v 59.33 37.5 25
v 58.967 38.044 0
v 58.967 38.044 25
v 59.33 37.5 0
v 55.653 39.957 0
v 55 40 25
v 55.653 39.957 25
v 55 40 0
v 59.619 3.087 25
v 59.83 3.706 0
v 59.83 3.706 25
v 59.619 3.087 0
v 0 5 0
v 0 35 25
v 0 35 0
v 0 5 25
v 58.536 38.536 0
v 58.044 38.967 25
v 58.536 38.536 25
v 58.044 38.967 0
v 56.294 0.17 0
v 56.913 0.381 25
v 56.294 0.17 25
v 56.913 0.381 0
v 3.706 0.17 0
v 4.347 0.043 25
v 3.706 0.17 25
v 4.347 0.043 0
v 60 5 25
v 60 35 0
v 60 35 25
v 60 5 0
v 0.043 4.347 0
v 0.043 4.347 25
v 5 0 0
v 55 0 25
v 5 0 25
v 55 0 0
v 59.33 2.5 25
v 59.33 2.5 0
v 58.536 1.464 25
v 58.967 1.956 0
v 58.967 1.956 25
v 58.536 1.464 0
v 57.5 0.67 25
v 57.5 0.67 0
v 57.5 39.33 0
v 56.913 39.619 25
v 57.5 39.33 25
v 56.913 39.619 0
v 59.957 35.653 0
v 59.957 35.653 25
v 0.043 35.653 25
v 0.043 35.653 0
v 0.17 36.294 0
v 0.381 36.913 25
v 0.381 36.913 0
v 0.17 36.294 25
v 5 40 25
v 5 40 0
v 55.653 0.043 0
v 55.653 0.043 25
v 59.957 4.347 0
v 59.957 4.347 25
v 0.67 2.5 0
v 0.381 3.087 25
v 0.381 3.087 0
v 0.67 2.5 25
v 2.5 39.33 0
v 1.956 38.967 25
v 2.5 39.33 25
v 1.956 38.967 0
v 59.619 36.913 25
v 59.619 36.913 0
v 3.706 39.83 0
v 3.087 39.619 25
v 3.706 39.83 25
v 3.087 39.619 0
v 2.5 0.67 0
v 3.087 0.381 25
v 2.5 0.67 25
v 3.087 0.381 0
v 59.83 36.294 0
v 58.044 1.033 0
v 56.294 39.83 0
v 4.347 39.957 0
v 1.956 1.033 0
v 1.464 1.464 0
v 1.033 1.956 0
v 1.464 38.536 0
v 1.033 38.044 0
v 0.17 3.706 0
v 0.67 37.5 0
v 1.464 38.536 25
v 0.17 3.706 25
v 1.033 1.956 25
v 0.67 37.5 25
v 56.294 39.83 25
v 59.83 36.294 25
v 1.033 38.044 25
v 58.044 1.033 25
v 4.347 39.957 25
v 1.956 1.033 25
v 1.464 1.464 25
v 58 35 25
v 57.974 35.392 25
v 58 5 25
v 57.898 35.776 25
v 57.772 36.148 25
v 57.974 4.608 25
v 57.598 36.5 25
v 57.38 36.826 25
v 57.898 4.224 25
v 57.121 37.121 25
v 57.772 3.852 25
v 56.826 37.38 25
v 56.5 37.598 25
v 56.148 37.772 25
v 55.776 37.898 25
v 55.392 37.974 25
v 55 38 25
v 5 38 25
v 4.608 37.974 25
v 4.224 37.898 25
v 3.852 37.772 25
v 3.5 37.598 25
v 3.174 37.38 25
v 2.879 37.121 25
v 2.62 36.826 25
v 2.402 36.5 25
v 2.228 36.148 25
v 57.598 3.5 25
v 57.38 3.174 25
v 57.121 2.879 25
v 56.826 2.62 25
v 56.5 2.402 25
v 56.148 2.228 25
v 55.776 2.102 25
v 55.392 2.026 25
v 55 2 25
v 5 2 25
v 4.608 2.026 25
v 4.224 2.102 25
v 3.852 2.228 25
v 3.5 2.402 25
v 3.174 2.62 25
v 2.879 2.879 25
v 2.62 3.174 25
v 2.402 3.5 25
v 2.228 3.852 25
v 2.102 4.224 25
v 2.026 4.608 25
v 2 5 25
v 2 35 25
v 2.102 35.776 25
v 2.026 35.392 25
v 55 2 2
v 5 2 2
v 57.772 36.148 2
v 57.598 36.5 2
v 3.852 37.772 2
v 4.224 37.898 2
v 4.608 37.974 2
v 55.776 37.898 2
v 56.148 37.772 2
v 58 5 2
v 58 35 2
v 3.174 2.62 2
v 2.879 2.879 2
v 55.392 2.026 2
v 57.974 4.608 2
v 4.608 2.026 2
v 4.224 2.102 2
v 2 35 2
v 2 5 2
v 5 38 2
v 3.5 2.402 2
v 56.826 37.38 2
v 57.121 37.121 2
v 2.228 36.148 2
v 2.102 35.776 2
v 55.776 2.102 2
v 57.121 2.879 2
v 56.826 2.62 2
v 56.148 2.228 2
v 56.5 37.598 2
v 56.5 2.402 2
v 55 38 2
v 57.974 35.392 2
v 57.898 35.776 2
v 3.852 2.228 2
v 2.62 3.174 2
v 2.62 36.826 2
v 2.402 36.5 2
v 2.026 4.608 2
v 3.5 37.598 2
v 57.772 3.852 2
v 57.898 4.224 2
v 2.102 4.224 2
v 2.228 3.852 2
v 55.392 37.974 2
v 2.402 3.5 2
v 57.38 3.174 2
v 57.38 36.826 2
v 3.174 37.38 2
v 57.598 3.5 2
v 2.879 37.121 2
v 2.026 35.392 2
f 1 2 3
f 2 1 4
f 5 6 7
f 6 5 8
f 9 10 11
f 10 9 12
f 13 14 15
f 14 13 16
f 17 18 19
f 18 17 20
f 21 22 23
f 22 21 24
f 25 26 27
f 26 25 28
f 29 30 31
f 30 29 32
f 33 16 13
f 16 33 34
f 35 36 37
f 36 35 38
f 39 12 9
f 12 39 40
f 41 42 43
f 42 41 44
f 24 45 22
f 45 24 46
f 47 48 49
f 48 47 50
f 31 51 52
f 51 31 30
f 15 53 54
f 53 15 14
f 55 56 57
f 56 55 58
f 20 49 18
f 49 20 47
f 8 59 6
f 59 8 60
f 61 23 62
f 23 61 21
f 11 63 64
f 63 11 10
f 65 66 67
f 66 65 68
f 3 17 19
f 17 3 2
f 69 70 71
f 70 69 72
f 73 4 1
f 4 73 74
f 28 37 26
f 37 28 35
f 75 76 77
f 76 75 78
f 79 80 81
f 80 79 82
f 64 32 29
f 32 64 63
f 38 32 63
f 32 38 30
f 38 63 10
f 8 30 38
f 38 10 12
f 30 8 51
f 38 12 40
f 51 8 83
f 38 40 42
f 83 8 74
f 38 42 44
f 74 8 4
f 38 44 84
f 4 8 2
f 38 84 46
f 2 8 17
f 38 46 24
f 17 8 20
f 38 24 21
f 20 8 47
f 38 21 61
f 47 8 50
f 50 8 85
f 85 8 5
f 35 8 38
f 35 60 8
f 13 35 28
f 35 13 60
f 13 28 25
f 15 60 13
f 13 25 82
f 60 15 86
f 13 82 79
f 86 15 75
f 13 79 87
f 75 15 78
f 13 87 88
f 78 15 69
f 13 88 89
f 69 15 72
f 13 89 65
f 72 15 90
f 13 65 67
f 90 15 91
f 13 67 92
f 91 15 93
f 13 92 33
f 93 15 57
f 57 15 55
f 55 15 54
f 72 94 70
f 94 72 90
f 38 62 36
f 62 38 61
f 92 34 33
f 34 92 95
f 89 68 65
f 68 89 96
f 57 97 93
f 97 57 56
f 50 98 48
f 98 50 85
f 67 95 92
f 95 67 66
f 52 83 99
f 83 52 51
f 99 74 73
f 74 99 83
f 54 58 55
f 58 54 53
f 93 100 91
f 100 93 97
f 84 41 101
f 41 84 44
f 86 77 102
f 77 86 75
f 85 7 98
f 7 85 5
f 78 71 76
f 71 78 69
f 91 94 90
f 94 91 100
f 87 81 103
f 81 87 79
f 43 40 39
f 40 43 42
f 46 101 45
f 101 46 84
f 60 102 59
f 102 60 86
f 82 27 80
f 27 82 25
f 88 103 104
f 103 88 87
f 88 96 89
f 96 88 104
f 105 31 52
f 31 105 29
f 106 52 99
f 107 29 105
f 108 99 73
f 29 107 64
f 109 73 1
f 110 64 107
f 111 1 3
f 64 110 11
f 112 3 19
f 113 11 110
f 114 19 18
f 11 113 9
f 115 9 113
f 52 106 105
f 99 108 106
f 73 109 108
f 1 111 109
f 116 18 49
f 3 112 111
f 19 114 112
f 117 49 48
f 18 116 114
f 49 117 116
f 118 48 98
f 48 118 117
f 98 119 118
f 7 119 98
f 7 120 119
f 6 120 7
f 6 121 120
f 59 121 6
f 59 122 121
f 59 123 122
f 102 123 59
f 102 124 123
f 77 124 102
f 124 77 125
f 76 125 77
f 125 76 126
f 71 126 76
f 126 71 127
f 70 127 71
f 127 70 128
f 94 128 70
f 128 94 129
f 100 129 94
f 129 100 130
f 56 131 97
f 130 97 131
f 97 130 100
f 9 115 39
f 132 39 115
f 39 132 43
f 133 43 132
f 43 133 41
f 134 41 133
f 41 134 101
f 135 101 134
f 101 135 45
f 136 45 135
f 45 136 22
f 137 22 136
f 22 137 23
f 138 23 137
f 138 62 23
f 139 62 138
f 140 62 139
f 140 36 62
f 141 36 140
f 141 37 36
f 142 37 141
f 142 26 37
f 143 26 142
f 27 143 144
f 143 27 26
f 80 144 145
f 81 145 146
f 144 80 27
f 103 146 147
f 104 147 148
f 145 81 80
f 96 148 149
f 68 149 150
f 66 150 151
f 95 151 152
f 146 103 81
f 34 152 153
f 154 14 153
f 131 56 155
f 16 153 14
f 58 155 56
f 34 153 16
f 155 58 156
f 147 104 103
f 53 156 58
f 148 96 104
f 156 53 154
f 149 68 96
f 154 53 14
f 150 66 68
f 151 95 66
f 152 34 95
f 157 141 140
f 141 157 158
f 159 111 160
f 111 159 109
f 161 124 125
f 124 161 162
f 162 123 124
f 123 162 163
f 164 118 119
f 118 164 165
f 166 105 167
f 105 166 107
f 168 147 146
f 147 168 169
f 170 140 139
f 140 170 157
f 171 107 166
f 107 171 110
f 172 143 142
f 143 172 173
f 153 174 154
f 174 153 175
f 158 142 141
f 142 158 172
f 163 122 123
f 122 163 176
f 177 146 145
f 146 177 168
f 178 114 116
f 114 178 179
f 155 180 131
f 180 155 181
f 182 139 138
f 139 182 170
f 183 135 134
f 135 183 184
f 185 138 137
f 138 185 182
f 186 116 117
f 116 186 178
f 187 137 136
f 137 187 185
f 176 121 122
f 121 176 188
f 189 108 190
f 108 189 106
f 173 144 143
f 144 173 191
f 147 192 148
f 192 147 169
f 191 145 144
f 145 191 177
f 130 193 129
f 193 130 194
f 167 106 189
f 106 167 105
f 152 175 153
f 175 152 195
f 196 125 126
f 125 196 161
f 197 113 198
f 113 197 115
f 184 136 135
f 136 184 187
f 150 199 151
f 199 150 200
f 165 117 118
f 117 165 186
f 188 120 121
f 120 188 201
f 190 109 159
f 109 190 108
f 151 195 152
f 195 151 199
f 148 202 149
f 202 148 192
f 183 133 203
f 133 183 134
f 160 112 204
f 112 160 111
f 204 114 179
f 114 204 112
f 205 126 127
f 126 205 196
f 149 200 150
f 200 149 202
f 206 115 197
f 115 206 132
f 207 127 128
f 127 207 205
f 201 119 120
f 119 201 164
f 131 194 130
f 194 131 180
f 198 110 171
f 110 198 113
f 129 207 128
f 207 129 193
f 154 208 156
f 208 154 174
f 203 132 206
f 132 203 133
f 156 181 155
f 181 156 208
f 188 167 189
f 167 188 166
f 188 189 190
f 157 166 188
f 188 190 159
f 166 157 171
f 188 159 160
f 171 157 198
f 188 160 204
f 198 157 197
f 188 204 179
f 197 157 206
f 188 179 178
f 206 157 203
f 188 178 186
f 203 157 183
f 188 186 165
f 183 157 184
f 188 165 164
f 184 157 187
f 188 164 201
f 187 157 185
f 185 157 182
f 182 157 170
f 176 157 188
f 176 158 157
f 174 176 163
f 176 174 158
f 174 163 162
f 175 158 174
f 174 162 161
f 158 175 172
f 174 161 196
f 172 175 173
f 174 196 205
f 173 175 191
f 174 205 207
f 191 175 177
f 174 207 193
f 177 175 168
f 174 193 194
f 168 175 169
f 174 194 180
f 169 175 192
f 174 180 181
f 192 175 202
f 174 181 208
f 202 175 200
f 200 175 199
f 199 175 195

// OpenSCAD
// Beispiel: Kiste mit abgerundeten Ecken (Maße in mm)
// Die Werte oben lassen sich unter „Regler“ einstellen.

breite = 60;   // [20:150]
tiefe  = 40;   // [20:150]
hoehe  = 25;   // [5:80]
wand   = 2;    // [1:0.5:5]
radius = 5;    // [1:15]

$fn = 48;

module abgerundet(b, t, h, r) {
  hull() {
    for (x = [r, b - r], y = [r, t - r])
      translate([x, y, 0]) cylinder(h = h, r = r);
  }
}

difference() {
  abgerundet(breite, tiefe, hoehe, radius);
  translate([wand, wand, wand])
    abgerundet(breite - 2 * wand, tiefe - 2 * wand, hoehe, max(radius - wand, 0.5));
}
